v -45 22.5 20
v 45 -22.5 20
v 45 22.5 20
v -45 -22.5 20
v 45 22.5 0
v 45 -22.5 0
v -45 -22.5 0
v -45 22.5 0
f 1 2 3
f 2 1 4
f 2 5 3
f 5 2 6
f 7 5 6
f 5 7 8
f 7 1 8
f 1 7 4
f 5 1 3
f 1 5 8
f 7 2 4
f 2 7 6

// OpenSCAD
// Drying Rack for 10 Microscope Slides
// Base dimensions
base_length = 90;   // X
base_width = 45;    // Y
base_height = 20;   // Z

// Slot dimensions
slot_length = 77;   // X
slot_width = 1.6;   // Y
slot_depth = 10;    // Z

// Slot arrangement
num_slots = 10;
slot_spacing = 3.5; // centre-to-centre in Y

// Calculate total width of the slot group
total_slot_group_width = (num_slots - 1) * slot_spacing;

// Starting Y position for the first slot (to centre the group)
start_y = -total_slot_group_width / 2;

$fn = 64;

// Base block
translate([-base_length/2, -base_width/2, 0])
    cube([base_length, base_width, base_height]);

// Cut out slots
for (i = [0 : num_slots-1]) {
    y_pos = start_y + i * slot_spacing;
    
    // Slot extends slightly past the base in X and Z to ensure clean cuts
    // Center the slot in X at 0, center in Y at y_pos, top at base_height
    // The slot is open at the top, so it starts at base_height and goes down by slot_depth
    // We add 0.01 to depth to ensure it cuts through the top face completely
    translate([0, y_pos, base_height - (slot_depth + 0.01)/2])
        cube([slot_length + 0.02, slot_width, slot_depth + 0.01], center = true);
}
